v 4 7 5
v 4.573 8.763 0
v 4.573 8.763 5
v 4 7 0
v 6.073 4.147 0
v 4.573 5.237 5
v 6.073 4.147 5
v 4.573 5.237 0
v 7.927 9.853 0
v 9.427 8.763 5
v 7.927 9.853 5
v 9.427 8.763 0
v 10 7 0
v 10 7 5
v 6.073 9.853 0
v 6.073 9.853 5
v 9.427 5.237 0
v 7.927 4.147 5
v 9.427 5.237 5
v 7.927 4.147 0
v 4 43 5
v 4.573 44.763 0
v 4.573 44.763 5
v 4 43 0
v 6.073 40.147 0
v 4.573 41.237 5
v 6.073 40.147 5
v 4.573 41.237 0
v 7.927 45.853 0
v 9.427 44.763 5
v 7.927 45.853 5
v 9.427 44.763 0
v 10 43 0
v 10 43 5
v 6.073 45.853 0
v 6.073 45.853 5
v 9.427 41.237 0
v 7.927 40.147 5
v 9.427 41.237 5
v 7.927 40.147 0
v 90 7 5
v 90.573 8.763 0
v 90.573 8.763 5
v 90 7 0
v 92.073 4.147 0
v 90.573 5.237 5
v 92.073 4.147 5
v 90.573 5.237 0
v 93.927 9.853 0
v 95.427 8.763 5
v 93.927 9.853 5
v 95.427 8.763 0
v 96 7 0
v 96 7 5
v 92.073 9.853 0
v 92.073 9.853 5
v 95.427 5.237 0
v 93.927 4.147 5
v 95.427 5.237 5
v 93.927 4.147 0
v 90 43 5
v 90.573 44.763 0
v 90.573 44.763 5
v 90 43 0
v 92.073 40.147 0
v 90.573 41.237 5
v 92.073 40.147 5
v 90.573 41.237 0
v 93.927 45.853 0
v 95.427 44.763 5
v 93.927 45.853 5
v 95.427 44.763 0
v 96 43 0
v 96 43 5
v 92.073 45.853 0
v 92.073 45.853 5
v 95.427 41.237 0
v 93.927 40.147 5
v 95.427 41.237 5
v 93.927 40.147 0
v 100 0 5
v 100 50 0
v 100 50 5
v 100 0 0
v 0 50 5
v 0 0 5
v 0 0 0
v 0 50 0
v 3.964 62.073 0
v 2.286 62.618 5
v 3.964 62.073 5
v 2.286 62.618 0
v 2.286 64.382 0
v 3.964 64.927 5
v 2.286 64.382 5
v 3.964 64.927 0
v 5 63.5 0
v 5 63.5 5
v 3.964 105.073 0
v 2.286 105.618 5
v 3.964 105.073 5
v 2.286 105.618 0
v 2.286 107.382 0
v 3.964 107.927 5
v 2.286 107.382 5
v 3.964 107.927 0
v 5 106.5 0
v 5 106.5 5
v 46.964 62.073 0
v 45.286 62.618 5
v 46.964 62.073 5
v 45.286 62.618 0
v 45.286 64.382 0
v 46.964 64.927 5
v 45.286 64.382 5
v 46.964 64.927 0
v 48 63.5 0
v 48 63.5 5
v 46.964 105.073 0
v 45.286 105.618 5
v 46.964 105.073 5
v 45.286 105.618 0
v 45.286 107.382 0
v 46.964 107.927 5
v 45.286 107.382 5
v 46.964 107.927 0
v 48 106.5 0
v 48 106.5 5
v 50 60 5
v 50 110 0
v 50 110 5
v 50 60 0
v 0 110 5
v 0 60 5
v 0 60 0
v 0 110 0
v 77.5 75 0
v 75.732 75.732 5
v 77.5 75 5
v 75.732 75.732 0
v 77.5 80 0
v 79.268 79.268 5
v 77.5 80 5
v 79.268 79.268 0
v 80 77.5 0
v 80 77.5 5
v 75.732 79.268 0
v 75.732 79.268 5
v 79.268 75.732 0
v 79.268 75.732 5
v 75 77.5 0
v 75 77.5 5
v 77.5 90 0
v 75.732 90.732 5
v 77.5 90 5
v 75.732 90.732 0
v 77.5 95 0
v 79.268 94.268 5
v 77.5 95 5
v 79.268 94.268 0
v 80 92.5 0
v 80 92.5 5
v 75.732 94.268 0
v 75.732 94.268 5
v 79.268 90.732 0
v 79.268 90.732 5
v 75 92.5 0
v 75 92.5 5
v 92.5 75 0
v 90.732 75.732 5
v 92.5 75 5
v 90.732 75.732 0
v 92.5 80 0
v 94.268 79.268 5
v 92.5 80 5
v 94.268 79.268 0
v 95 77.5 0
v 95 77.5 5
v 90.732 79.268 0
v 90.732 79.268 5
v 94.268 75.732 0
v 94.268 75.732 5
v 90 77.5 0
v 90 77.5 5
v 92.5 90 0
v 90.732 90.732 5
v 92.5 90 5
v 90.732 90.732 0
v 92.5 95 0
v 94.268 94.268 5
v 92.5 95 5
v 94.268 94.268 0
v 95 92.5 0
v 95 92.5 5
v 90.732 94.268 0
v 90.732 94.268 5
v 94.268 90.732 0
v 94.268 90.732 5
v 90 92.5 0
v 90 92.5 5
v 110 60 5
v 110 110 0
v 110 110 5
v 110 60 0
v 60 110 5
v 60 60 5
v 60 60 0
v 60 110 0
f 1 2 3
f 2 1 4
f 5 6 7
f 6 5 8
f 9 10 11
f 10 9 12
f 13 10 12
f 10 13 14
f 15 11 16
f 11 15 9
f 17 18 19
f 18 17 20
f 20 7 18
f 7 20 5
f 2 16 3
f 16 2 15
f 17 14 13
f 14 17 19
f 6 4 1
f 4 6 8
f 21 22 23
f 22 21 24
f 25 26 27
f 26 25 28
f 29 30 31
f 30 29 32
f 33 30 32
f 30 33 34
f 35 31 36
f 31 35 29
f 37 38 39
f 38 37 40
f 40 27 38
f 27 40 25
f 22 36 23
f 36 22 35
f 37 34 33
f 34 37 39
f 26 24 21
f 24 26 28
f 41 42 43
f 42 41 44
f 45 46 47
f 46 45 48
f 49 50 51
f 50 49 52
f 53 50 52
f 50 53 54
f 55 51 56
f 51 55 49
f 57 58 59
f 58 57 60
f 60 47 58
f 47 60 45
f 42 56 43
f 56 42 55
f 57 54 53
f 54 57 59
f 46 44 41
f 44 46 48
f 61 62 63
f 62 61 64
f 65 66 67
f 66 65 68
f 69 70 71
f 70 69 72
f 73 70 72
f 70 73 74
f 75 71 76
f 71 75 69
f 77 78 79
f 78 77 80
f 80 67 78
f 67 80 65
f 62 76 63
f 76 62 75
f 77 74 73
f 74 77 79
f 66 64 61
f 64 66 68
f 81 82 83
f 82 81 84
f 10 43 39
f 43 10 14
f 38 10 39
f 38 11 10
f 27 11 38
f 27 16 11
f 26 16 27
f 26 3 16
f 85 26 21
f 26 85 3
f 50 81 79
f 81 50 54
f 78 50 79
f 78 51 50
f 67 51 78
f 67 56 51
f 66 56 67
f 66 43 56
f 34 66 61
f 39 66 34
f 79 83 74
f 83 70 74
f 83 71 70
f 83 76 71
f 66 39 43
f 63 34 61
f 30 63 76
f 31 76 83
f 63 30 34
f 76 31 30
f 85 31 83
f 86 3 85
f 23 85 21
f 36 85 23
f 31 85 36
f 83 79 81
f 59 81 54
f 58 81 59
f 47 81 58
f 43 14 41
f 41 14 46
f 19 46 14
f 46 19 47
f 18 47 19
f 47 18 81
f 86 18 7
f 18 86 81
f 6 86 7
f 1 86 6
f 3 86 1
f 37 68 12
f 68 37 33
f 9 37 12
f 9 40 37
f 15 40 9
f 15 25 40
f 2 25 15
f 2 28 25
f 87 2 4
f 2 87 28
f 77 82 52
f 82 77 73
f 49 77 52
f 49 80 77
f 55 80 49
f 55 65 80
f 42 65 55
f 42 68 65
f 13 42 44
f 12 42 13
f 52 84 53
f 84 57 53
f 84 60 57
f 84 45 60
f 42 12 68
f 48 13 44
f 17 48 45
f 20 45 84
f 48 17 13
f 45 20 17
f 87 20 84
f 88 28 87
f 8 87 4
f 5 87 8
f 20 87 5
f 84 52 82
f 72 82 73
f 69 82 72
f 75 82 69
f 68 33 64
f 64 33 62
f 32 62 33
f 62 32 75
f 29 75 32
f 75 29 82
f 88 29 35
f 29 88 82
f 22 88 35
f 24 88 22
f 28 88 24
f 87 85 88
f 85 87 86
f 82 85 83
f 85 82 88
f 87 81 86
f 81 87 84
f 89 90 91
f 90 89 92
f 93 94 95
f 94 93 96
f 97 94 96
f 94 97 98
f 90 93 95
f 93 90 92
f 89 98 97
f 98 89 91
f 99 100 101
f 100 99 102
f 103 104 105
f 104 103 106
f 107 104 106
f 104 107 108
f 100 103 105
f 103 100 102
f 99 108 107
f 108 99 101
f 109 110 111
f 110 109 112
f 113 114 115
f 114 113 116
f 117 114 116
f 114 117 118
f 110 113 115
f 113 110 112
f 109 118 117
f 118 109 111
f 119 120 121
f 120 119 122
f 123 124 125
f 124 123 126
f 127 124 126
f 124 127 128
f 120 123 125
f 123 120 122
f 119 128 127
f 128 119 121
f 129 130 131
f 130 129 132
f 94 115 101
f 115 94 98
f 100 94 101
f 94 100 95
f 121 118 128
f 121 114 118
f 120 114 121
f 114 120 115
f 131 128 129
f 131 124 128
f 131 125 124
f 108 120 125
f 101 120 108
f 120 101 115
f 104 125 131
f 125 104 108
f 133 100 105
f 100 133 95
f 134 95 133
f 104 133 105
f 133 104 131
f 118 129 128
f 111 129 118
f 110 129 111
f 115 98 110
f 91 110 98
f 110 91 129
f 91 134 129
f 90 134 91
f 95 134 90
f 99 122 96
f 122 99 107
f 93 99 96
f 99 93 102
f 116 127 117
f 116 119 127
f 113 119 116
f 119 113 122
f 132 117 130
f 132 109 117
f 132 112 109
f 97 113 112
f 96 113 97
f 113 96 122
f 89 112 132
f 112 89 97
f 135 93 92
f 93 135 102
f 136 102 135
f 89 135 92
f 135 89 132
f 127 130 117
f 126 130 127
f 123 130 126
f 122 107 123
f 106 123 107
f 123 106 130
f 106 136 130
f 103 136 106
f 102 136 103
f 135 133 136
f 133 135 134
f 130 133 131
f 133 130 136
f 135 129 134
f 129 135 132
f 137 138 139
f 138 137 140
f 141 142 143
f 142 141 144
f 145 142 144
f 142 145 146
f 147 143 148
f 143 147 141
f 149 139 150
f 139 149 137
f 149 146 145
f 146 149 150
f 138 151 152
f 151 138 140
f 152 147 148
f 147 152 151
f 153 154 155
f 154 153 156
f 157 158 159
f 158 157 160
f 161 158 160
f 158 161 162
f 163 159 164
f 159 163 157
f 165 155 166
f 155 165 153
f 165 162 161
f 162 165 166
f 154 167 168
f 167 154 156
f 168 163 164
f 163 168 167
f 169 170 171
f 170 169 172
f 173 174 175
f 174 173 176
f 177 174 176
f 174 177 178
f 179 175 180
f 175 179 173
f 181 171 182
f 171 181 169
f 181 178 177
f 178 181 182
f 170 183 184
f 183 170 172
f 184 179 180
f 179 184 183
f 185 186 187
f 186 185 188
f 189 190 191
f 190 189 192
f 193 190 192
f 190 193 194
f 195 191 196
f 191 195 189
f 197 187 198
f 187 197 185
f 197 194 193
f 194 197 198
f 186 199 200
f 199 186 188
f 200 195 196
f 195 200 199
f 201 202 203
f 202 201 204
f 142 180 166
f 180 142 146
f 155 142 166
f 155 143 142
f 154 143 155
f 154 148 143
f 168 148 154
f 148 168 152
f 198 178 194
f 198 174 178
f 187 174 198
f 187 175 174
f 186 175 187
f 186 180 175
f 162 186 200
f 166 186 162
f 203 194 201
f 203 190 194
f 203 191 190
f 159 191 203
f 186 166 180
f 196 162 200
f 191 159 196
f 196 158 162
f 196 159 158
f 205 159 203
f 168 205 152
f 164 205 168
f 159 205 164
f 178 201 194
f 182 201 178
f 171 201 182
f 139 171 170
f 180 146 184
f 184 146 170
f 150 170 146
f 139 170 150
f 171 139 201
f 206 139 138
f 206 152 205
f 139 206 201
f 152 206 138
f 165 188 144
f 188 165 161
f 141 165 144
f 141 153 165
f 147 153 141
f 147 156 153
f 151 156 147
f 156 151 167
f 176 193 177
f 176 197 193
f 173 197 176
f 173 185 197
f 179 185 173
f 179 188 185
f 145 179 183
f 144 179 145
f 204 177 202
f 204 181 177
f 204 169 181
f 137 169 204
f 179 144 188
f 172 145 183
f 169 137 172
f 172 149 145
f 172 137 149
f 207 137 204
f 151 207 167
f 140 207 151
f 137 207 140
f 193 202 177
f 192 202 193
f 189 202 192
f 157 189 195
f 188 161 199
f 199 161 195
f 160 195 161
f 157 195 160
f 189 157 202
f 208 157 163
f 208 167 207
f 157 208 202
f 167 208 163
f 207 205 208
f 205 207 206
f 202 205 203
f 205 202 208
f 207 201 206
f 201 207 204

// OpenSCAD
module hole_plate( size=[100,50,5], hole_dm=6, hole_margin=4) {
    
    difference() {
        cube(size);
        
        abs_margin = hole_margin + hole_dm / 2;
        x_hole_dist = size.x - 2 * abs_margin;
        y_hole_dist = size.y - 2 * abs_margin;
        x_values = [abs_margin : x_hole_dist : size.x - abs_margin];
        y_values = [abs_margin : y_hole_dist : size.y - abs_margin];
        
        // 4 holes with for loop
        for (x = x_values, y = y_values)
            translate([x, y, -1])
            color( "red" )
                cylinder( h = size.z + 2, d = hole_dm);
    }
}

//hole_plate([80,50,10], 6, 4);

hole_plate();

translate( [0, 60, 0])
hole_plate( size = [50,50,5], hole_margin = 2, hole_dm = 3);

translate( [60, 60, 0])
hole_plate( size = [50,50,5], hole_margin = 15, hole_dm = 5);
